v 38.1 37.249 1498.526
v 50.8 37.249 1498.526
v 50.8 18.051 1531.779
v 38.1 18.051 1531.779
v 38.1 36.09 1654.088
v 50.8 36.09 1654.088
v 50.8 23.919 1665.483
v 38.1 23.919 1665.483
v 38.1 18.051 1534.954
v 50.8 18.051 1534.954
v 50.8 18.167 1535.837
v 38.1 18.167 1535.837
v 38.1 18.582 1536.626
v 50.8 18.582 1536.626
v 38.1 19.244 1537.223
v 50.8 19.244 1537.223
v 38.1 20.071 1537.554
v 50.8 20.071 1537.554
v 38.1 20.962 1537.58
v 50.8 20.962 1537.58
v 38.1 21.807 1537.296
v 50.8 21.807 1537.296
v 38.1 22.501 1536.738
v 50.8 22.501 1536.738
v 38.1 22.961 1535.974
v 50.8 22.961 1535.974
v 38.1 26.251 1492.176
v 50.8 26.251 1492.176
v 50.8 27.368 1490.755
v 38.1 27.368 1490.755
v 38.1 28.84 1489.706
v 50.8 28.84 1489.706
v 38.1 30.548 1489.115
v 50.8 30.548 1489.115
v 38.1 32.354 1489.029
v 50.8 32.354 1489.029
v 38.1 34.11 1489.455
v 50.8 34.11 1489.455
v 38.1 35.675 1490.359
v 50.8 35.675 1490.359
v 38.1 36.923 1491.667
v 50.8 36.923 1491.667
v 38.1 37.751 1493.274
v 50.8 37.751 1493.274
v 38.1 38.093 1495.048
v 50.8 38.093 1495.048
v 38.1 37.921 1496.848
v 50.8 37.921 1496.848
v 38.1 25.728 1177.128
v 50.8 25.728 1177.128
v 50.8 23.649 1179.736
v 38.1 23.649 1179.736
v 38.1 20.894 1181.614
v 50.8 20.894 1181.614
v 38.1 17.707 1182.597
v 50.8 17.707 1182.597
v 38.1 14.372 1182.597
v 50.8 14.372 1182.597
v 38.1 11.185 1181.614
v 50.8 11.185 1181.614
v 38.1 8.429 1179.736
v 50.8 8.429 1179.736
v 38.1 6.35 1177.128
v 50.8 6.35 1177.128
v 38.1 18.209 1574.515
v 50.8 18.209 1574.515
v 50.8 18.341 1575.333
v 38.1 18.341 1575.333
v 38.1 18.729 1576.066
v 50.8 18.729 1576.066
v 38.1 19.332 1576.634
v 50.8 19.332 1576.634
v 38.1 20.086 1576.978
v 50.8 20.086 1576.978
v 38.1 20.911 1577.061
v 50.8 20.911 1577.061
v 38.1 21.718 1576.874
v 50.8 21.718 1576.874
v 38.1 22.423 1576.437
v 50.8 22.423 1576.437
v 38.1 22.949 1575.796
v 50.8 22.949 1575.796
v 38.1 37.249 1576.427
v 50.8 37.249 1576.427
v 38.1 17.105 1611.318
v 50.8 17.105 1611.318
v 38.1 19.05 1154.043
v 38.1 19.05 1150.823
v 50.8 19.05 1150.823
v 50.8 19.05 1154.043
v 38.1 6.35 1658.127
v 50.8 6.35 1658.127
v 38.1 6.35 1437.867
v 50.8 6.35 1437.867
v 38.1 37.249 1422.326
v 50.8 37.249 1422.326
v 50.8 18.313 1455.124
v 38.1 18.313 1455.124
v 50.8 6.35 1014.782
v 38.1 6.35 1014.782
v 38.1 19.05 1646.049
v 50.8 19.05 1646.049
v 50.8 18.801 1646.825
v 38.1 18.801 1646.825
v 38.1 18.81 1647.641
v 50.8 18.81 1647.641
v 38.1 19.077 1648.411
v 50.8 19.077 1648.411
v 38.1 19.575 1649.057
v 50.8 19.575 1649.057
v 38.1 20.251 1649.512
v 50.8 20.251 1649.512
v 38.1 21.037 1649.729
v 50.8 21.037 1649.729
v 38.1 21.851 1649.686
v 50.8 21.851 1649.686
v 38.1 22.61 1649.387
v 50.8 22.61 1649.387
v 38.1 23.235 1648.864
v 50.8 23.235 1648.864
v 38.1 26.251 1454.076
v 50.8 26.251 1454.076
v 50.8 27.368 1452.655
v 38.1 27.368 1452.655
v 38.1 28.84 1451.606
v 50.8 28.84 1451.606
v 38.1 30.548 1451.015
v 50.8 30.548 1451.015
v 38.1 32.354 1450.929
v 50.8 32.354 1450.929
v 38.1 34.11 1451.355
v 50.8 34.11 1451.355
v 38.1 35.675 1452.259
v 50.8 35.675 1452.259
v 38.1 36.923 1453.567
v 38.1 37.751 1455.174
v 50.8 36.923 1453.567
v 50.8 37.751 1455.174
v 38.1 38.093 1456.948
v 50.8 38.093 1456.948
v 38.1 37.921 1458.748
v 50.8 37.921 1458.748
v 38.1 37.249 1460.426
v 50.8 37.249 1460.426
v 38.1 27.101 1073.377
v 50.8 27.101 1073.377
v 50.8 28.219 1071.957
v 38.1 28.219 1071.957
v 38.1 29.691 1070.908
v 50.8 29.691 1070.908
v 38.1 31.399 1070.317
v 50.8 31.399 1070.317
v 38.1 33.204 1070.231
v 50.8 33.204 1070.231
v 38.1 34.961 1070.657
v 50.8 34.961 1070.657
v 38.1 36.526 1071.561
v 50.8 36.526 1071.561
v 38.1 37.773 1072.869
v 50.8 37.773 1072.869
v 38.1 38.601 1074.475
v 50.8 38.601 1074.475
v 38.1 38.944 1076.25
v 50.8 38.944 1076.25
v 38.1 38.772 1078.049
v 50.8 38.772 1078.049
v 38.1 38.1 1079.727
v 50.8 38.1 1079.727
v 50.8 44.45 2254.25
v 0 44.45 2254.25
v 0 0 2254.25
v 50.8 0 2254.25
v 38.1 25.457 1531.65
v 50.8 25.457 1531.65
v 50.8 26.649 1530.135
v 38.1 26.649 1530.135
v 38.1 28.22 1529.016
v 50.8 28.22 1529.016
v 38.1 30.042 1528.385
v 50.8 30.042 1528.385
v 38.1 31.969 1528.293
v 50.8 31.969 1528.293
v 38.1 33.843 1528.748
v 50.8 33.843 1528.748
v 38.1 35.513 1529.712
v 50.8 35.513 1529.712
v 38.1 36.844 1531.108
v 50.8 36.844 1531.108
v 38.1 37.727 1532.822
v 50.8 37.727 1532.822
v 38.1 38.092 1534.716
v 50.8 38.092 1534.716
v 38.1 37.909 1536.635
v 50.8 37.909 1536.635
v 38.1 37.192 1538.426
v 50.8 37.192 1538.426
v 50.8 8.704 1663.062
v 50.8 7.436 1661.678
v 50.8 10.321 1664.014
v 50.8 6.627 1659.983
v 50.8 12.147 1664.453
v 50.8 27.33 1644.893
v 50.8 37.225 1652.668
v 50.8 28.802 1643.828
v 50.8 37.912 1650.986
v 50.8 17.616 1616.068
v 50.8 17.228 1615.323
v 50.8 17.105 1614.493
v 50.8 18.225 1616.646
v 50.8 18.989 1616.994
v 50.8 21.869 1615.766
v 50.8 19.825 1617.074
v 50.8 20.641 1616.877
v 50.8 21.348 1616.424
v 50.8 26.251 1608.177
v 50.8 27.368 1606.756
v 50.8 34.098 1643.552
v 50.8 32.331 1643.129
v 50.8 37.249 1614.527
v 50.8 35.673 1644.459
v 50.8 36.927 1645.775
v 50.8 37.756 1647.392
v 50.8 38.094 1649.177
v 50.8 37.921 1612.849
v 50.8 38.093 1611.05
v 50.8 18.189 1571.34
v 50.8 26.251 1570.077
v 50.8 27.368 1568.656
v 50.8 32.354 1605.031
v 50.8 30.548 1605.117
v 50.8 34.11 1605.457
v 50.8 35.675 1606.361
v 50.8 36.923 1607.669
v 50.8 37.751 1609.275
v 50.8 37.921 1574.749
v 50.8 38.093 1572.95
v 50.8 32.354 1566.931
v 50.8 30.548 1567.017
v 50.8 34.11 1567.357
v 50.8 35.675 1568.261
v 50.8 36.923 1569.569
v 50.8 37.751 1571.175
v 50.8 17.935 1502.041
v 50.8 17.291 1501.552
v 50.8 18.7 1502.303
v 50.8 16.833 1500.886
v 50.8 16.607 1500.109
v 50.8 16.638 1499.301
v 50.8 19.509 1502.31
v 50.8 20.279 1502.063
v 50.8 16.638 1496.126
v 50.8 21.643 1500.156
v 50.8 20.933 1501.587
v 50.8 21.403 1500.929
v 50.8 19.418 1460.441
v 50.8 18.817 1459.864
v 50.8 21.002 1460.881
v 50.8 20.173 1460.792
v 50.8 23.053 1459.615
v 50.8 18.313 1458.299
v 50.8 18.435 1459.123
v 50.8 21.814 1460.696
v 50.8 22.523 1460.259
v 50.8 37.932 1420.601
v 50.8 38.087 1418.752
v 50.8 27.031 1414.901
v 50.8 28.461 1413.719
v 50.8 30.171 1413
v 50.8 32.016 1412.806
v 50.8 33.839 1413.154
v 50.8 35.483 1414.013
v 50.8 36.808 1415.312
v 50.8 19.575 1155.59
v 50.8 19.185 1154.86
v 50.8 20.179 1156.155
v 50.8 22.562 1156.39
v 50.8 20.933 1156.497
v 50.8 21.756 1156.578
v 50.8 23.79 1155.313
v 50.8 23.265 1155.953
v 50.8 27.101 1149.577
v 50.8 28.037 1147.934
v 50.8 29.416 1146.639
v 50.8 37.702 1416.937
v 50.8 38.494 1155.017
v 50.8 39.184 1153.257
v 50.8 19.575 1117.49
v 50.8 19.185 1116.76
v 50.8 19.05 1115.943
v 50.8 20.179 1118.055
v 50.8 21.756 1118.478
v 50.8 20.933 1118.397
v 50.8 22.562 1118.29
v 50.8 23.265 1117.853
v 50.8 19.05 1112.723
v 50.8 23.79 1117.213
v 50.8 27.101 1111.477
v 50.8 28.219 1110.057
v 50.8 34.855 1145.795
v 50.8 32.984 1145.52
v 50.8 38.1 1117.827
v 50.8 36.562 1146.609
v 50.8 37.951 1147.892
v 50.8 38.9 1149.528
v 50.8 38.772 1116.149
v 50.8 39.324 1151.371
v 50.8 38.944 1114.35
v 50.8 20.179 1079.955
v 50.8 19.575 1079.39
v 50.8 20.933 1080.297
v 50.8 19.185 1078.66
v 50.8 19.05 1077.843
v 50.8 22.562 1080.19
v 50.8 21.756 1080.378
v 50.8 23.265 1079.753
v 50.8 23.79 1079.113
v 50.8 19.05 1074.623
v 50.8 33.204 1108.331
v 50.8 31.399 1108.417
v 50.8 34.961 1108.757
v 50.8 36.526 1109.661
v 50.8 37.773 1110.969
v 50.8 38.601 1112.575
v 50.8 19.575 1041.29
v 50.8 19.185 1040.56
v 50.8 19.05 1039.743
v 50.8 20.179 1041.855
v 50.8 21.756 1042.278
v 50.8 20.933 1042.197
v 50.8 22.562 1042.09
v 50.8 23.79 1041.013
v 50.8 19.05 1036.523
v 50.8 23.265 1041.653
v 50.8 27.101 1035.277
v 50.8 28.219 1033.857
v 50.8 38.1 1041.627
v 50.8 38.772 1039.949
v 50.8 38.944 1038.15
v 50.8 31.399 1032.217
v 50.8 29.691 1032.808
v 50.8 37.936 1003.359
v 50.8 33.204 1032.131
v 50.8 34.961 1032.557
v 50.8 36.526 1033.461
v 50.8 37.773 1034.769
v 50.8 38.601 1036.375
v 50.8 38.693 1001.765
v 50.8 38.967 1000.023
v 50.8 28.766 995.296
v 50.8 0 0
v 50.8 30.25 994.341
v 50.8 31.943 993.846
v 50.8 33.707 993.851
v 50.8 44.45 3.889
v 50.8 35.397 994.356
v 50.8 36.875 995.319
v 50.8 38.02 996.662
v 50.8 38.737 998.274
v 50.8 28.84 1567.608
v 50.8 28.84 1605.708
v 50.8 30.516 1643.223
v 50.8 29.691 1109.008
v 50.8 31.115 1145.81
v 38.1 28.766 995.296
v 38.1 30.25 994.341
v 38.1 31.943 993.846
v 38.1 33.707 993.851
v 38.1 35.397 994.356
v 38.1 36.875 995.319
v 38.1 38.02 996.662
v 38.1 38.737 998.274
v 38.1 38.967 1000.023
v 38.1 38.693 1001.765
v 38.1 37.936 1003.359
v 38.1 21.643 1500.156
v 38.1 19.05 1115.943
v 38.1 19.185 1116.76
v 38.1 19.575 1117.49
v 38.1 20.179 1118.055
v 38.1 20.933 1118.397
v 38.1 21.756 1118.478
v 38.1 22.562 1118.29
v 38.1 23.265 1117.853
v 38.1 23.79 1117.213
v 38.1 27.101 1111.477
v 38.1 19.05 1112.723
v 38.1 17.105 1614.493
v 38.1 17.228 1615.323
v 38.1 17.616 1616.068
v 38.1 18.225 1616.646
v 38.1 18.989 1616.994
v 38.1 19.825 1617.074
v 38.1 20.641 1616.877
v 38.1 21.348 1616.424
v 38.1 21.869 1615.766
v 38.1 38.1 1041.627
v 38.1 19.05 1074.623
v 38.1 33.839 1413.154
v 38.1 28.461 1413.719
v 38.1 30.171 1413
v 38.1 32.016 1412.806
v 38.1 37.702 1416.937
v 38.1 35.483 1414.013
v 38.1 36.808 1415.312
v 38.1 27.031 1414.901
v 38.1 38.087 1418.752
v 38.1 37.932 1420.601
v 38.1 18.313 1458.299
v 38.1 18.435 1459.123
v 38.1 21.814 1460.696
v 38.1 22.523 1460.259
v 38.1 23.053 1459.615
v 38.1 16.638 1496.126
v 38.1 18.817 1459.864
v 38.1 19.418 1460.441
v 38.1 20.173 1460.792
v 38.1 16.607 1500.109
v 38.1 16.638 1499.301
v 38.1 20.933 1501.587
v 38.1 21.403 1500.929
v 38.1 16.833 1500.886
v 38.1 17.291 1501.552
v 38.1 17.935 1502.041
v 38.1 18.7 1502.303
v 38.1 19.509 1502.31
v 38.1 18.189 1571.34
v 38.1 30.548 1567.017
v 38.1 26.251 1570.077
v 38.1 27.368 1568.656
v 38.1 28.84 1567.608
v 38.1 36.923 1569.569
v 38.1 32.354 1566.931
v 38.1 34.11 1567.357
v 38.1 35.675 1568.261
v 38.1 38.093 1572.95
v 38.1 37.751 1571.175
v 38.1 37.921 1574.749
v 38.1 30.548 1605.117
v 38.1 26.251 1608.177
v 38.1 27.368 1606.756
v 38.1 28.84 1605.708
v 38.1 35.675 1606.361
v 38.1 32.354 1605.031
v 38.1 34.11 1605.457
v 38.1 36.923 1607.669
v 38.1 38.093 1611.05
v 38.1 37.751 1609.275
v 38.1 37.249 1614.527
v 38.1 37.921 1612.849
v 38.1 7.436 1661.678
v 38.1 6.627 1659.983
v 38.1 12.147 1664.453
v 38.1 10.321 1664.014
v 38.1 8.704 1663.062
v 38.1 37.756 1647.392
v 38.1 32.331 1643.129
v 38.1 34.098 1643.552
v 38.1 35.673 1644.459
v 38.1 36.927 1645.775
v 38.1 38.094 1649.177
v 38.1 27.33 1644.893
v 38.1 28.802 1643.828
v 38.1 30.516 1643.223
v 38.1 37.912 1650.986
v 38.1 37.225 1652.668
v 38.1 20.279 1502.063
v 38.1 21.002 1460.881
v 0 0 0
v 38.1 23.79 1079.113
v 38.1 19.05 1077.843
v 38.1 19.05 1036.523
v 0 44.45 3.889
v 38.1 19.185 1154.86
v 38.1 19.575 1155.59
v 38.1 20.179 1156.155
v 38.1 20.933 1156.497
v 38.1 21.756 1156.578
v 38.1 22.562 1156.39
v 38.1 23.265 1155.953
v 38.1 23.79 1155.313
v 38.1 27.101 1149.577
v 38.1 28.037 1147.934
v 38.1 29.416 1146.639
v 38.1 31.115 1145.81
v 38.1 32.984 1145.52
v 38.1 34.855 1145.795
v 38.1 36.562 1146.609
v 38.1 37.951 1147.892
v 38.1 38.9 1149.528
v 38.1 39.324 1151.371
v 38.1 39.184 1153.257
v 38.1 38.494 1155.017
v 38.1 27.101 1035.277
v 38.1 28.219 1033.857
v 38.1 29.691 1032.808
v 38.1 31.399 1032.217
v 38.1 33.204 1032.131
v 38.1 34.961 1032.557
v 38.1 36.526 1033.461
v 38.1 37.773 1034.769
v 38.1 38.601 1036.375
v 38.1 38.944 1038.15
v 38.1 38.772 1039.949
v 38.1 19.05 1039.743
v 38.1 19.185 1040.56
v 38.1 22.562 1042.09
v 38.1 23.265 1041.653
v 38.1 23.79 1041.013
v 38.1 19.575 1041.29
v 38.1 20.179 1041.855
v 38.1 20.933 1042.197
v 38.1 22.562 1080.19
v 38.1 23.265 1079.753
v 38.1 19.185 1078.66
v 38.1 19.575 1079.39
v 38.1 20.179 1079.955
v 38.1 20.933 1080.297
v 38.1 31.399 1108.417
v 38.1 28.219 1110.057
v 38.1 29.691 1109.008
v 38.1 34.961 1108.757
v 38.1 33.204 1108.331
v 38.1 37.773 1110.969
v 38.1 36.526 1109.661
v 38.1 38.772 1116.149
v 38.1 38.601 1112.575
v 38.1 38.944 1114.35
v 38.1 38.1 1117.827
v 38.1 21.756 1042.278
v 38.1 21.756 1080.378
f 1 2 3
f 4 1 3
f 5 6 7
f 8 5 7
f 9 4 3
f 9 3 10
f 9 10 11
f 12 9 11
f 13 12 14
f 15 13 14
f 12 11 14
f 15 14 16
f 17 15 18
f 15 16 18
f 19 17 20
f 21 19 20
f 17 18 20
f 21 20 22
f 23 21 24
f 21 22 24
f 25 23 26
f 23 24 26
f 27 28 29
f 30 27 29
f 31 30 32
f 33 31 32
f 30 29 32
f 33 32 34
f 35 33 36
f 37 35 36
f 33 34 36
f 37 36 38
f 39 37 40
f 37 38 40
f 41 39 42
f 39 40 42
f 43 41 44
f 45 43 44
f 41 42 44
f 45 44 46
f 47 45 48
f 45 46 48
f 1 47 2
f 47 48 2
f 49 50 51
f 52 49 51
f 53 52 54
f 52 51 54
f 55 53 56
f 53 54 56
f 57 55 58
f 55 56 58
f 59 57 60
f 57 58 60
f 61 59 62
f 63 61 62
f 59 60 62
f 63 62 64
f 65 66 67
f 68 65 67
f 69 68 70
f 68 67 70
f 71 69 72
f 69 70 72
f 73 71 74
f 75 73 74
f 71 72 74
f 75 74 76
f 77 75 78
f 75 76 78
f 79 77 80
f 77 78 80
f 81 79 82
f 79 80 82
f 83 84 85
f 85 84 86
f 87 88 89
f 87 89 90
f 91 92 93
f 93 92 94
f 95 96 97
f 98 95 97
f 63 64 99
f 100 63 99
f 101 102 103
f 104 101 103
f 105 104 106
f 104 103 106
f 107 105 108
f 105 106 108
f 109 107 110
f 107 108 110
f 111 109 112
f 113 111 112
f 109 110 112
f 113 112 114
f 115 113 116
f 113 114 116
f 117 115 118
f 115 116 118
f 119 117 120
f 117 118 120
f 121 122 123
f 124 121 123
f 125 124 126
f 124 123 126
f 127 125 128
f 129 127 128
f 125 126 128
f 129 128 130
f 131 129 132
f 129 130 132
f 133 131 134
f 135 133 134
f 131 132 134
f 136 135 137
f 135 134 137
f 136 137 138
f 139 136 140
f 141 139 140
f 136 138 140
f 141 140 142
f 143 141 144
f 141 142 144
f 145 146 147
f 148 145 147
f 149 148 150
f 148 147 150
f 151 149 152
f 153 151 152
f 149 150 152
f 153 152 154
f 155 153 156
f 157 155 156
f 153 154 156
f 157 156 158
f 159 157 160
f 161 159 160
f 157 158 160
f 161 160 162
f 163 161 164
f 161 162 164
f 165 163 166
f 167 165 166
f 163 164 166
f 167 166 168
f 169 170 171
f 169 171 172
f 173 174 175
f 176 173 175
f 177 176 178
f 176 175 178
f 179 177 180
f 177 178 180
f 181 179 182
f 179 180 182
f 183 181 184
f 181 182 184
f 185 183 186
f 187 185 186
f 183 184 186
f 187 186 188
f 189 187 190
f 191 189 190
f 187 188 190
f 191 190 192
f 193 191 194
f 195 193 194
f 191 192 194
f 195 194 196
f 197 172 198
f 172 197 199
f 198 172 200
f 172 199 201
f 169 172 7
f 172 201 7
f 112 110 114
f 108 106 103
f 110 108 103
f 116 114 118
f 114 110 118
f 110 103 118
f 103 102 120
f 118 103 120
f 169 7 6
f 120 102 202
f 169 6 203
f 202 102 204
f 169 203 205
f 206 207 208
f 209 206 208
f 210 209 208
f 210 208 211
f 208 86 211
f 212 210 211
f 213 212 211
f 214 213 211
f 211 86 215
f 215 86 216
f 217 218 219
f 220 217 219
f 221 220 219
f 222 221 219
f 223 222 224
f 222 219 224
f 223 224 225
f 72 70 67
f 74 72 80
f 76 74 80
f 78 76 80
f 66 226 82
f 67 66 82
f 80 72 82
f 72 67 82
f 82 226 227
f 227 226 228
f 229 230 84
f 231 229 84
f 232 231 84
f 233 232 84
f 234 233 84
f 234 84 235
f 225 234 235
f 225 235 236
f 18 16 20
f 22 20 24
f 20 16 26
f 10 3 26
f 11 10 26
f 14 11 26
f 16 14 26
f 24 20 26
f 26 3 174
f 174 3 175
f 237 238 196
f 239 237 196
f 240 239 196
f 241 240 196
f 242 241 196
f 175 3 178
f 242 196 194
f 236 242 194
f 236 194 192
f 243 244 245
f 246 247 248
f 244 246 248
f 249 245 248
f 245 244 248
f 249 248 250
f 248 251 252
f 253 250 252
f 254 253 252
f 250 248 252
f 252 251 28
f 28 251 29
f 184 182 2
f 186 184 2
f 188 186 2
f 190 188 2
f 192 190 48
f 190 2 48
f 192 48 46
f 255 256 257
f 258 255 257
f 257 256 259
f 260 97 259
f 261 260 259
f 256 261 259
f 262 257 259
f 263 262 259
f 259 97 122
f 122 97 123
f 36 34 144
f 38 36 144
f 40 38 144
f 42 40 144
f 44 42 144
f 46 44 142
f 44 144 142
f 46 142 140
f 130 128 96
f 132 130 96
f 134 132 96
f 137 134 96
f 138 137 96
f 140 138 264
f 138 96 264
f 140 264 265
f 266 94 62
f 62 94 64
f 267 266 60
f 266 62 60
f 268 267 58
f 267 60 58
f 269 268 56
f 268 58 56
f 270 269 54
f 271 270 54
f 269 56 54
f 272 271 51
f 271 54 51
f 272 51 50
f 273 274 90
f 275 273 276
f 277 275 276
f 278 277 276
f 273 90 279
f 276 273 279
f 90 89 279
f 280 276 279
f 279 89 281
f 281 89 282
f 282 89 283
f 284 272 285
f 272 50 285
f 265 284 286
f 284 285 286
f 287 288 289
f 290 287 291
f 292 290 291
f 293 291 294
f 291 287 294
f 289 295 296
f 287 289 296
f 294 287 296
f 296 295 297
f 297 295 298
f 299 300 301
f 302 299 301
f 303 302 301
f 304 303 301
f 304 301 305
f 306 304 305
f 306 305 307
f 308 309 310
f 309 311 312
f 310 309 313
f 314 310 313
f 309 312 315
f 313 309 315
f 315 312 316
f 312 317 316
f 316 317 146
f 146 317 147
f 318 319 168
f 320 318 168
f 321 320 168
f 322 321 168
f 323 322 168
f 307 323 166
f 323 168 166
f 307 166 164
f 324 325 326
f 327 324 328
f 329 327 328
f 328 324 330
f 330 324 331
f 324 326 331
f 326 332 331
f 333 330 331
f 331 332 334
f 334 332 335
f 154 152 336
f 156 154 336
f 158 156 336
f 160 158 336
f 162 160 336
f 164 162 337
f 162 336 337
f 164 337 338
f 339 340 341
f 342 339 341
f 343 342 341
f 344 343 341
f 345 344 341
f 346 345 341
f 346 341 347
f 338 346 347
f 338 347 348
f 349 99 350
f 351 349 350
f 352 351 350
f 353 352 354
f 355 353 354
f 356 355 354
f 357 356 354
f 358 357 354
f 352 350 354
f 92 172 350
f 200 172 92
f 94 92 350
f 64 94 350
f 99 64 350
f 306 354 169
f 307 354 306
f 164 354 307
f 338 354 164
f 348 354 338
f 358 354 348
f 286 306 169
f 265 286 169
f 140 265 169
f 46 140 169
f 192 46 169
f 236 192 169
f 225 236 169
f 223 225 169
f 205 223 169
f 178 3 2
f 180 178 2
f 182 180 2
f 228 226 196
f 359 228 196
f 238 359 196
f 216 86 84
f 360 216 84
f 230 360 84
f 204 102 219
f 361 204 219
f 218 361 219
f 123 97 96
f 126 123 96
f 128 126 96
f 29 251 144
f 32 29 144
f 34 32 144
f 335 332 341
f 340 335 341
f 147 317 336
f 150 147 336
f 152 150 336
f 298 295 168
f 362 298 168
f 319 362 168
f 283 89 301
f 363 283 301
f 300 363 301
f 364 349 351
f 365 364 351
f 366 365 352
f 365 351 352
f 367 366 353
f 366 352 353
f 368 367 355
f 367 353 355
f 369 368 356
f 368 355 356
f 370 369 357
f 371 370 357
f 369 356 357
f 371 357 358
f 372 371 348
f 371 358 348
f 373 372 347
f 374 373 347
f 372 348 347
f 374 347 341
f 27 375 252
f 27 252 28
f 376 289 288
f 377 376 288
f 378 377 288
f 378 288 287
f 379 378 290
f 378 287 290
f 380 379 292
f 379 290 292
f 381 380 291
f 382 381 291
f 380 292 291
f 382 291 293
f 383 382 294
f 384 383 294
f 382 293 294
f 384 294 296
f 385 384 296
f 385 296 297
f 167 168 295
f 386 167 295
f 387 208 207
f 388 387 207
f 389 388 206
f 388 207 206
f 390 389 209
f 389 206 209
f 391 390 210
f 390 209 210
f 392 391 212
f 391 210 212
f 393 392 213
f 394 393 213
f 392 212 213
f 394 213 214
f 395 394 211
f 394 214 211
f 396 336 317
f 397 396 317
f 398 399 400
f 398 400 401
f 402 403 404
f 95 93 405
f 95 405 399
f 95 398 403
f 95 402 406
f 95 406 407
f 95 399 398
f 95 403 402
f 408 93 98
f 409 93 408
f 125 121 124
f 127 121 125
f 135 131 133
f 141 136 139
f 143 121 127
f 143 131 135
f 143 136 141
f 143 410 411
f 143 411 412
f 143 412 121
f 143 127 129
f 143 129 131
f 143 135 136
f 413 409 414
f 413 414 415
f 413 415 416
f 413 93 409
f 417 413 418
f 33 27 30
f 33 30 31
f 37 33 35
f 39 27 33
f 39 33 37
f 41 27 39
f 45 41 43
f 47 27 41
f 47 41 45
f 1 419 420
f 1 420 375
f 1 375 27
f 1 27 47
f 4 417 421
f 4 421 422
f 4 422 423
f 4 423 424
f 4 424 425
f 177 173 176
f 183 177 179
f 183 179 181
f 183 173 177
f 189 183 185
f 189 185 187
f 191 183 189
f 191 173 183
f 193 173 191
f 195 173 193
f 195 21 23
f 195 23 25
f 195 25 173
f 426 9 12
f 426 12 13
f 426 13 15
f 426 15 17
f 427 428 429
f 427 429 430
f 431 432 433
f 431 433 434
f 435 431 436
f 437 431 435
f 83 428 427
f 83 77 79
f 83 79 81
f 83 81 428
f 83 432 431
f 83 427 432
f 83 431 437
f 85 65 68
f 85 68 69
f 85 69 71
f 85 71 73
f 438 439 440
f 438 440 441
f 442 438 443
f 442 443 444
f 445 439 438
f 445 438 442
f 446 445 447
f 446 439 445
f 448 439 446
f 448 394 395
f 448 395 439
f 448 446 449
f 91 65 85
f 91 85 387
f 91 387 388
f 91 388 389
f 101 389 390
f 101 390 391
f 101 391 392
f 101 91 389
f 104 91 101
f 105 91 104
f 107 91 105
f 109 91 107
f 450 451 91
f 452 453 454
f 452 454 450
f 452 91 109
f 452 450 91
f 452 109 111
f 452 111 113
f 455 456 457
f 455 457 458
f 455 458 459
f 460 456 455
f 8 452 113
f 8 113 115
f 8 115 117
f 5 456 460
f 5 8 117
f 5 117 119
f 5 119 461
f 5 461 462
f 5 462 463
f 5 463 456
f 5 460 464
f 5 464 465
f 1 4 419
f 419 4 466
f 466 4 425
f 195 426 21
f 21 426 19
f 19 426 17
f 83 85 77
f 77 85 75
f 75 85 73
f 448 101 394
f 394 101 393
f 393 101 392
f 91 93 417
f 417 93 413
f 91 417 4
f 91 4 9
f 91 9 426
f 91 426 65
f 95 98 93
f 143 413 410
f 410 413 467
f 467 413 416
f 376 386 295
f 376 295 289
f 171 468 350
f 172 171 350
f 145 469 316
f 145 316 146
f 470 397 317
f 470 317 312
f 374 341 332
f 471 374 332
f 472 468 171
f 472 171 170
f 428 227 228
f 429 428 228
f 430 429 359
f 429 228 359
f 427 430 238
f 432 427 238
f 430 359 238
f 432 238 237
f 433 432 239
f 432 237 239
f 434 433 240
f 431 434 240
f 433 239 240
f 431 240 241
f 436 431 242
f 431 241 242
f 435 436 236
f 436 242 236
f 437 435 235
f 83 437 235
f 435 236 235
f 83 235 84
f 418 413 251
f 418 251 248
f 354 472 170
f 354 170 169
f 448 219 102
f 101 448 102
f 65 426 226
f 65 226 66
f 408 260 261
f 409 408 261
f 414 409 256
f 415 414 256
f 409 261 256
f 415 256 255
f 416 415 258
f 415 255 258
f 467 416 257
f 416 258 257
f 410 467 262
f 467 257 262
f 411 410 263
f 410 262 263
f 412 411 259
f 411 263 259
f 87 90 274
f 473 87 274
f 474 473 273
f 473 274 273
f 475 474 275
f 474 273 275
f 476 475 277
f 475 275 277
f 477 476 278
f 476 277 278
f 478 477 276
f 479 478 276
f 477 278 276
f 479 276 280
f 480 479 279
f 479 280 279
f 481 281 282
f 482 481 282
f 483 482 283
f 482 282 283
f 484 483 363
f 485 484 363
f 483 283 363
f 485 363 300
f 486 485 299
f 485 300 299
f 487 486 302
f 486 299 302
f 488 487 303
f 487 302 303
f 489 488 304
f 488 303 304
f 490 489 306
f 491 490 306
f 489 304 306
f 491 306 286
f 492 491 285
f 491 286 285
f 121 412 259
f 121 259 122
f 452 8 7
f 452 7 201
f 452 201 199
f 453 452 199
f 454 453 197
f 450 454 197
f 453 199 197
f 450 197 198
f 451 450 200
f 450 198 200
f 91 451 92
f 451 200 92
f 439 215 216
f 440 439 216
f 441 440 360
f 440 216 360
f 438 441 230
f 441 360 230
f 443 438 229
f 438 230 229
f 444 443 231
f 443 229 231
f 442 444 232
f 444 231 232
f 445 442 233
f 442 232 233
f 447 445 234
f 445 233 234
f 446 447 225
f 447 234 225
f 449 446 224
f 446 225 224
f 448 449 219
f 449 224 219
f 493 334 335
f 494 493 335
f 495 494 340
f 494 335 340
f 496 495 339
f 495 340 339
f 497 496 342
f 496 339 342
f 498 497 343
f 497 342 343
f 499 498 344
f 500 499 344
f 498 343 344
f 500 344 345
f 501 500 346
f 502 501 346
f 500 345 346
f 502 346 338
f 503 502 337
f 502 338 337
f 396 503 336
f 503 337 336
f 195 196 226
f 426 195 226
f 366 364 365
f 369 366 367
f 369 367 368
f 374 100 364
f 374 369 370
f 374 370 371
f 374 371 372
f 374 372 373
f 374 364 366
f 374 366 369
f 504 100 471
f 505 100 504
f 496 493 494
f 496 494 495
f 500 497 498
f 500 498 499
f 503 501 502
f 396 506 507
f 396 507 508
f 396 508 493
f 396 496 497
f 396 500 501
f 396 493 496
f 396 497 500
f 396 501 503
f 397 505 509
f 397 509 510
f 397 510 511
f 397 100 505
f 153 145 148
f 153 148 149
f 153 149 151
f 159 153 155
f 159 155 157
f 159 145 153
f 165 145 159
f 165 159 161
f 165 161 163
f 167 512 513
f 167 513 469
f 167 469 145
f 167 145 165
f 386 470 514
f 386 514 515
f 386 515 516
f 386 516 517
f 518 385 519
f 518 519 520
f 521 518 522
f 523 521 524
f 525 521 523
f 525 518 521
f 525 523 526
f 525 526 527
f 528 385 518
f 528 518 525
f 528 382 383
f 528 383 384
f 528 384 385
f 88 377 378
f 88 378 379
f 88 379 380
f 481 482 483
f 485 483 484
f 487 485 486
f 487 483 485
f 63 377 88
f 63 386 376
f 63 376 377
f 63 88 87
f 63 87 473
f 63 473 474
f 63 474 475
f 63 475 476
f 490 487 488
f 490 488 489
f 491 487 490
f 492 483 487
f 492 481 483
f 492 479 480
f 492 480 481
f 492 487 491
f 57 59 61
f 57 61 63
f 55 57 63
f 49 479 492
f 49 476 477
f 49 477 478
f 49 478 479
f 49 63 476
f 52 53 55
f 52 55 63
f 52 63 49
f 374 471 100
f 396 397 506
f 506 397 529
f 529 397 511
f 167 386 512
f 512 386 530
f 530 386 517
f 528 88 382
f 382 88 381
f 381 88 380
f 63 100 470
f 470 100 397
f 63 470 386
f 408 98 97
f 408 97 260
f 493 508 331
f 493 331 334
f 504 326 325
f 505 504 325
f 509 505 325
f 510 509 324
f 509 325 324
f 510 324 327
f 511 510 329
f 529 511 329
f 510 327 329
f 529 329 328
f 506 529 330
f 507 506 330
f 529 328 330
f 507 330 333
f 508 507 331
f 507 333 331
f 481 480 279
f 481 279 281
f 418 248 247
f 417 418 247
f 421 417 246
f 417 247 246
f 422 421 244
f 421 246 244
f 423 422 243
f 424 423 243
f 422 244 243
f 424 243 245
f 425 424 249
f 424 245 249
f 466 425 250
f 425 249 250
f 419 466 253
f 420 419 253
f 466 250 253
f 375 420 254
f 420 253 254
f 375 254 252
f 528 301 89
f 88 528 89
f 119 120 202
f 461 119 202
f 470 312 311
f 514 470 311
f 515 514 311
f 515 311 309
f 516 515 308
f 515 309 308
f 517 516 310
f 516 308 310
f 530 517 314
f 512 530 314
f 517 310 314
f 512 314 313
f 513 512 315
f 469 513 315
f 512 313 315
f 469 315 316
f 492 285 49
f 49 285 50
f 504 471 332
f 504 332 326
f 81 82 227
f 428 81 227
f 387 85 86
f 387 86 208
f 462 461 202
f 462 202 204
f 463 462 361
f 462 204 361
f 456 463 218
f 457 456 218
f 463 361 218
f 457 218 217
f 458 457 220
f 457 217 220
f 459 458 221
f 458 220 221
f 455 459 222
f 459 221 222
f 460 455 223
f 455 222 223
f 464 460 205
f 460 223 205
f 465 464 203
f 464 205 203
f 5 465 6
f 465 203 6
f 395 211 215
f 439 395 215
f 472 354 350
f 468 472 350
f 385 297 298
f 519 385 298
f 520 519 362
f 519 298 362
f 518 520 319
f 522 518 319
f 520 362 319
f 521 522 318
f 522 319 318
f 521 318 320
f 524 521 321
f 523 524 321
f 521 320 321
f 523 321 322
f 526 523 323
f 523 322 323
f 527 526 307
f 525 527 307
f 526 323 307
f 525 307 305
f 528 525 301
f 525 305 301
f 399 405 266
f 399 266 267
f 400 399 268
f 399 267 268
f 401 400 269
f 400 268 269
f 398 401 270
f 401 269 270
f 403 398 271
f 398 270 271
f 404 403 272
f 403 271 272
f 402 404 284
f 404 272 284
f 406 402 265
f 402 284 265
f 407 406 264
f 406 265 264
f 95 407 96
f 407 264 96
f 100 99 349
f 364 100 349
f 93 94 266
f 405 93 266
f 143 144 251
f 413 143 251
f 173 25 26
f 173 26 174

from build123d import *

# Parameters (mm, degrees)
F0_W     = 50.8
F0_H     = 44.45
F1_DEPTH = 2254.25
F3_DEPTH = 101.6
F8_DEPTH = 12.7


with BuildPart() as f1:
    # F0 (on Top) → F1 (new body)
    with BuildSketch(Plane.XY):
        with Locations((25.4, 22.225)):
            Rectangle(F0_W, F0_H)
    extrude(amount=F1_DEPTH)

    # F2 (on face) → F3 (cut)
    with BuildSketch(Plane.YZ.offset(50.8)):
        Polygon((44.45, 3.888871), (0, 0), (44.45, 0), align=None)
    extrude(amount=-F3_DEPTH, mode=Mode.SUBTRACT)

    # F7 (on face) → F8 (cut)
    with BuildSketch(Plane.YZ.offset(50.8)):
        with BuildLine():
            Line((6.35, 1150.822904), (6.35, 1014.78219))
            Line((6.35, 1014.78219), (28.766256, 995.296036))
            ThreePointArc((28.766256, 995.296036), (36.875365, 995.319042), (37.935552, 1003.358581))
            Line((37.935552, 1003.358581), (19.05, 1036.522904))
            Line((19.05, 1036.522904), (19.05, 1039.743495))
            ThreePointArc((19.05, 1039.743495), (20.9326, 1042.196947), (23.789705, 1041.013495))
            Line((23.789705, 1041.013495), (27.101477, 1035.277336))
            ThreePointArc((27.101477, 1035.277336), (35.775739, 1032.953075), (38.1, 1041.627336))
            Line((38.1, 1041.627336), (19.05, 1074.622904))
            Line((19.05, 1074.622904), (19.05, 1077.843495))
            ThreePointArc((19.05, 1077.843495), (20.9326, 1080.296947), (23.789705, 1079.113495))
            Line((23.789705, 1079.113495), (27.101477, 1073.377336))
            ThreePointArc((27.101477, 1073.377336), (35.775739, 1071.053075), (38.1, 1079.727336))
            Line((38.1, 1079.727336), (19.05, 1112.722904))
            Line((19.05, 1112.722904), (19.05, 1115.943495))
            ThreePointArc((19.05, 1115.943495), (20.9326, 1118.396947), (23.789705, 1117.213495))
            Line((23.789705, 1117.213495), (27.101477, 1111.477336))
            ThreePointArc((27.101477, 1111.477336), (35.775739, 1109.153075), (38.1, 1117.827336))
            Line((38.1, 1117.827336), (19.05, 1150.822904))
            Line((19.05, 1150.822904), (19.05, 1154.043495))
            ThreePointArc((19.05, 1154.043495), (20.9326, 1156.496947), (23.789705, 1155.313495))
            Line((23.789705, 1155.313495), (27.101477, 1149.577336))
            ThreePointArc((27.101477, 1149.577336), (35.739022, 1146.137909), (38.494059, 1155.01747))
            Line((38.494059, 1155.01747), (25.728455, 1177.128144))
            ThreePointArc((25.728455, 1177.128144), (16.039228, 1182.722223), (6.35, 1177.128144))
            Line((6.35, 1177.128144), (6.35, 1150.822904))
        make_face()
        with BuildLine():
            ThreePointArc((26.250739, 1492.17557), (34.925, 1489.851309), (37.249261, 1498.52557))
            Line((37.249261, 1498.52557), (18.050561, 1531.778695))
            Line((18.050561, 1531.778695), (18.050561, 1534.953695))
            ThreePointArc((18.050561, 1534.953695), (20.071193, 1537.554318), (22.960683, 1535.974114))
            Line((22.960683, 1535.974114), (25.456989, 1531.650385))
            ThreePointArc((25.456989, 1531.650385), (34.712315, 1529.170428), (37.192273, 1538.425755))
            Line((37.192273, 1538.425755), (18.189293, 1571.339881))
            Line((18.189293, 1571.339881), (18.20906, 1574.51482))
            ThreePointArc((18.20906, 1574.51482), (20.086101, 1576.978242), (22.948739, 1575.796279))
            Line((22.948739, 1575.796279), (26.250739, 1570.077047))
            ThreePointArc((26.250739, 1570.077047), (34.925, 1567.752786), (37.249261, 1576.427047))
            Line((37.249261, 1576.427047), (17.105197, 1611.31759))
            Line((17.105197, 1611.31759), (17.105197, 1614.49259))
            ThreePointArc((17.105197, 1614.49259), (18.988881, 1616.993811), (21.869285, 1615.765948))
            Line((21.869285, 1615.765948), (26.250739, 1608.177047))
            ThreePointArc((26.250739, 1608.177047), (34.925, 1605.852786), (37.249261, 1614.527047))
            Line((37.249261, 1614.527047), (19.05, 1646.049093))
            ThreePointArc((19.05, 1646.049093), (19.894771, 1649.311639), (23.235009, 1648.863688))
            Line((23.235009, 1648.863688), (27.329522, 1644.893334))
            ThreePointArc((27.329522, 1644.893334), (36.34728, 1645.071692), (36.089896, 1654.087541))
            Line((36.089896, 1654.087541), (23.91872, 1665.482583))
            Line((23.91872, 1665.482583), (12.146561, 1664.452653))
            ThreePointArc((12.146561, 1664.452653), (8.018289, 1662.416814), (6.35, 1658.126817))
            Line((6.35, 1658.126817), (6.35, 1437.866909))
            Line((6.35, 1437.866909), (27.031333, 1414.901254))
            ThreePointArc((27.031333, 1414.901254), (35.482619, 1414.013445), (37.249261, 1422.32557))
            Line((37.249261, 1422.32557), (18.313239, 1455.123723))
            Line((18.313239, 1455.123723), (18.313239, 1458.298723))
            ThreePointArc((18.313239, 1458.298723), (20.17307, 1460.792401), (23.052521, 1459.615046))
            Line((23.052521, 1459.615046), (26.250739, 1454.07557))
            ThreePointArc((26.250739, 1454.07557), (34.925, 1451.751309), (37.249261, 1460.42557))
            Line((37.249261, 1460.42557), (16.637531, 1496.126135))
            Line((16.637531, 1496.126135), (16.637531, 1499.301135))
            ThreePointArc((16.637531, 1499.301135), (18.700471, 1502.302601), (21.642993, 1500.15642))
            Line((21.642993, 1500.15642), (26.250739, 1492.17557))
        make_face()
    extrude(amount=-F8_DEPTH, mode=Mode.SUBTRACT)


solid = f1.part
